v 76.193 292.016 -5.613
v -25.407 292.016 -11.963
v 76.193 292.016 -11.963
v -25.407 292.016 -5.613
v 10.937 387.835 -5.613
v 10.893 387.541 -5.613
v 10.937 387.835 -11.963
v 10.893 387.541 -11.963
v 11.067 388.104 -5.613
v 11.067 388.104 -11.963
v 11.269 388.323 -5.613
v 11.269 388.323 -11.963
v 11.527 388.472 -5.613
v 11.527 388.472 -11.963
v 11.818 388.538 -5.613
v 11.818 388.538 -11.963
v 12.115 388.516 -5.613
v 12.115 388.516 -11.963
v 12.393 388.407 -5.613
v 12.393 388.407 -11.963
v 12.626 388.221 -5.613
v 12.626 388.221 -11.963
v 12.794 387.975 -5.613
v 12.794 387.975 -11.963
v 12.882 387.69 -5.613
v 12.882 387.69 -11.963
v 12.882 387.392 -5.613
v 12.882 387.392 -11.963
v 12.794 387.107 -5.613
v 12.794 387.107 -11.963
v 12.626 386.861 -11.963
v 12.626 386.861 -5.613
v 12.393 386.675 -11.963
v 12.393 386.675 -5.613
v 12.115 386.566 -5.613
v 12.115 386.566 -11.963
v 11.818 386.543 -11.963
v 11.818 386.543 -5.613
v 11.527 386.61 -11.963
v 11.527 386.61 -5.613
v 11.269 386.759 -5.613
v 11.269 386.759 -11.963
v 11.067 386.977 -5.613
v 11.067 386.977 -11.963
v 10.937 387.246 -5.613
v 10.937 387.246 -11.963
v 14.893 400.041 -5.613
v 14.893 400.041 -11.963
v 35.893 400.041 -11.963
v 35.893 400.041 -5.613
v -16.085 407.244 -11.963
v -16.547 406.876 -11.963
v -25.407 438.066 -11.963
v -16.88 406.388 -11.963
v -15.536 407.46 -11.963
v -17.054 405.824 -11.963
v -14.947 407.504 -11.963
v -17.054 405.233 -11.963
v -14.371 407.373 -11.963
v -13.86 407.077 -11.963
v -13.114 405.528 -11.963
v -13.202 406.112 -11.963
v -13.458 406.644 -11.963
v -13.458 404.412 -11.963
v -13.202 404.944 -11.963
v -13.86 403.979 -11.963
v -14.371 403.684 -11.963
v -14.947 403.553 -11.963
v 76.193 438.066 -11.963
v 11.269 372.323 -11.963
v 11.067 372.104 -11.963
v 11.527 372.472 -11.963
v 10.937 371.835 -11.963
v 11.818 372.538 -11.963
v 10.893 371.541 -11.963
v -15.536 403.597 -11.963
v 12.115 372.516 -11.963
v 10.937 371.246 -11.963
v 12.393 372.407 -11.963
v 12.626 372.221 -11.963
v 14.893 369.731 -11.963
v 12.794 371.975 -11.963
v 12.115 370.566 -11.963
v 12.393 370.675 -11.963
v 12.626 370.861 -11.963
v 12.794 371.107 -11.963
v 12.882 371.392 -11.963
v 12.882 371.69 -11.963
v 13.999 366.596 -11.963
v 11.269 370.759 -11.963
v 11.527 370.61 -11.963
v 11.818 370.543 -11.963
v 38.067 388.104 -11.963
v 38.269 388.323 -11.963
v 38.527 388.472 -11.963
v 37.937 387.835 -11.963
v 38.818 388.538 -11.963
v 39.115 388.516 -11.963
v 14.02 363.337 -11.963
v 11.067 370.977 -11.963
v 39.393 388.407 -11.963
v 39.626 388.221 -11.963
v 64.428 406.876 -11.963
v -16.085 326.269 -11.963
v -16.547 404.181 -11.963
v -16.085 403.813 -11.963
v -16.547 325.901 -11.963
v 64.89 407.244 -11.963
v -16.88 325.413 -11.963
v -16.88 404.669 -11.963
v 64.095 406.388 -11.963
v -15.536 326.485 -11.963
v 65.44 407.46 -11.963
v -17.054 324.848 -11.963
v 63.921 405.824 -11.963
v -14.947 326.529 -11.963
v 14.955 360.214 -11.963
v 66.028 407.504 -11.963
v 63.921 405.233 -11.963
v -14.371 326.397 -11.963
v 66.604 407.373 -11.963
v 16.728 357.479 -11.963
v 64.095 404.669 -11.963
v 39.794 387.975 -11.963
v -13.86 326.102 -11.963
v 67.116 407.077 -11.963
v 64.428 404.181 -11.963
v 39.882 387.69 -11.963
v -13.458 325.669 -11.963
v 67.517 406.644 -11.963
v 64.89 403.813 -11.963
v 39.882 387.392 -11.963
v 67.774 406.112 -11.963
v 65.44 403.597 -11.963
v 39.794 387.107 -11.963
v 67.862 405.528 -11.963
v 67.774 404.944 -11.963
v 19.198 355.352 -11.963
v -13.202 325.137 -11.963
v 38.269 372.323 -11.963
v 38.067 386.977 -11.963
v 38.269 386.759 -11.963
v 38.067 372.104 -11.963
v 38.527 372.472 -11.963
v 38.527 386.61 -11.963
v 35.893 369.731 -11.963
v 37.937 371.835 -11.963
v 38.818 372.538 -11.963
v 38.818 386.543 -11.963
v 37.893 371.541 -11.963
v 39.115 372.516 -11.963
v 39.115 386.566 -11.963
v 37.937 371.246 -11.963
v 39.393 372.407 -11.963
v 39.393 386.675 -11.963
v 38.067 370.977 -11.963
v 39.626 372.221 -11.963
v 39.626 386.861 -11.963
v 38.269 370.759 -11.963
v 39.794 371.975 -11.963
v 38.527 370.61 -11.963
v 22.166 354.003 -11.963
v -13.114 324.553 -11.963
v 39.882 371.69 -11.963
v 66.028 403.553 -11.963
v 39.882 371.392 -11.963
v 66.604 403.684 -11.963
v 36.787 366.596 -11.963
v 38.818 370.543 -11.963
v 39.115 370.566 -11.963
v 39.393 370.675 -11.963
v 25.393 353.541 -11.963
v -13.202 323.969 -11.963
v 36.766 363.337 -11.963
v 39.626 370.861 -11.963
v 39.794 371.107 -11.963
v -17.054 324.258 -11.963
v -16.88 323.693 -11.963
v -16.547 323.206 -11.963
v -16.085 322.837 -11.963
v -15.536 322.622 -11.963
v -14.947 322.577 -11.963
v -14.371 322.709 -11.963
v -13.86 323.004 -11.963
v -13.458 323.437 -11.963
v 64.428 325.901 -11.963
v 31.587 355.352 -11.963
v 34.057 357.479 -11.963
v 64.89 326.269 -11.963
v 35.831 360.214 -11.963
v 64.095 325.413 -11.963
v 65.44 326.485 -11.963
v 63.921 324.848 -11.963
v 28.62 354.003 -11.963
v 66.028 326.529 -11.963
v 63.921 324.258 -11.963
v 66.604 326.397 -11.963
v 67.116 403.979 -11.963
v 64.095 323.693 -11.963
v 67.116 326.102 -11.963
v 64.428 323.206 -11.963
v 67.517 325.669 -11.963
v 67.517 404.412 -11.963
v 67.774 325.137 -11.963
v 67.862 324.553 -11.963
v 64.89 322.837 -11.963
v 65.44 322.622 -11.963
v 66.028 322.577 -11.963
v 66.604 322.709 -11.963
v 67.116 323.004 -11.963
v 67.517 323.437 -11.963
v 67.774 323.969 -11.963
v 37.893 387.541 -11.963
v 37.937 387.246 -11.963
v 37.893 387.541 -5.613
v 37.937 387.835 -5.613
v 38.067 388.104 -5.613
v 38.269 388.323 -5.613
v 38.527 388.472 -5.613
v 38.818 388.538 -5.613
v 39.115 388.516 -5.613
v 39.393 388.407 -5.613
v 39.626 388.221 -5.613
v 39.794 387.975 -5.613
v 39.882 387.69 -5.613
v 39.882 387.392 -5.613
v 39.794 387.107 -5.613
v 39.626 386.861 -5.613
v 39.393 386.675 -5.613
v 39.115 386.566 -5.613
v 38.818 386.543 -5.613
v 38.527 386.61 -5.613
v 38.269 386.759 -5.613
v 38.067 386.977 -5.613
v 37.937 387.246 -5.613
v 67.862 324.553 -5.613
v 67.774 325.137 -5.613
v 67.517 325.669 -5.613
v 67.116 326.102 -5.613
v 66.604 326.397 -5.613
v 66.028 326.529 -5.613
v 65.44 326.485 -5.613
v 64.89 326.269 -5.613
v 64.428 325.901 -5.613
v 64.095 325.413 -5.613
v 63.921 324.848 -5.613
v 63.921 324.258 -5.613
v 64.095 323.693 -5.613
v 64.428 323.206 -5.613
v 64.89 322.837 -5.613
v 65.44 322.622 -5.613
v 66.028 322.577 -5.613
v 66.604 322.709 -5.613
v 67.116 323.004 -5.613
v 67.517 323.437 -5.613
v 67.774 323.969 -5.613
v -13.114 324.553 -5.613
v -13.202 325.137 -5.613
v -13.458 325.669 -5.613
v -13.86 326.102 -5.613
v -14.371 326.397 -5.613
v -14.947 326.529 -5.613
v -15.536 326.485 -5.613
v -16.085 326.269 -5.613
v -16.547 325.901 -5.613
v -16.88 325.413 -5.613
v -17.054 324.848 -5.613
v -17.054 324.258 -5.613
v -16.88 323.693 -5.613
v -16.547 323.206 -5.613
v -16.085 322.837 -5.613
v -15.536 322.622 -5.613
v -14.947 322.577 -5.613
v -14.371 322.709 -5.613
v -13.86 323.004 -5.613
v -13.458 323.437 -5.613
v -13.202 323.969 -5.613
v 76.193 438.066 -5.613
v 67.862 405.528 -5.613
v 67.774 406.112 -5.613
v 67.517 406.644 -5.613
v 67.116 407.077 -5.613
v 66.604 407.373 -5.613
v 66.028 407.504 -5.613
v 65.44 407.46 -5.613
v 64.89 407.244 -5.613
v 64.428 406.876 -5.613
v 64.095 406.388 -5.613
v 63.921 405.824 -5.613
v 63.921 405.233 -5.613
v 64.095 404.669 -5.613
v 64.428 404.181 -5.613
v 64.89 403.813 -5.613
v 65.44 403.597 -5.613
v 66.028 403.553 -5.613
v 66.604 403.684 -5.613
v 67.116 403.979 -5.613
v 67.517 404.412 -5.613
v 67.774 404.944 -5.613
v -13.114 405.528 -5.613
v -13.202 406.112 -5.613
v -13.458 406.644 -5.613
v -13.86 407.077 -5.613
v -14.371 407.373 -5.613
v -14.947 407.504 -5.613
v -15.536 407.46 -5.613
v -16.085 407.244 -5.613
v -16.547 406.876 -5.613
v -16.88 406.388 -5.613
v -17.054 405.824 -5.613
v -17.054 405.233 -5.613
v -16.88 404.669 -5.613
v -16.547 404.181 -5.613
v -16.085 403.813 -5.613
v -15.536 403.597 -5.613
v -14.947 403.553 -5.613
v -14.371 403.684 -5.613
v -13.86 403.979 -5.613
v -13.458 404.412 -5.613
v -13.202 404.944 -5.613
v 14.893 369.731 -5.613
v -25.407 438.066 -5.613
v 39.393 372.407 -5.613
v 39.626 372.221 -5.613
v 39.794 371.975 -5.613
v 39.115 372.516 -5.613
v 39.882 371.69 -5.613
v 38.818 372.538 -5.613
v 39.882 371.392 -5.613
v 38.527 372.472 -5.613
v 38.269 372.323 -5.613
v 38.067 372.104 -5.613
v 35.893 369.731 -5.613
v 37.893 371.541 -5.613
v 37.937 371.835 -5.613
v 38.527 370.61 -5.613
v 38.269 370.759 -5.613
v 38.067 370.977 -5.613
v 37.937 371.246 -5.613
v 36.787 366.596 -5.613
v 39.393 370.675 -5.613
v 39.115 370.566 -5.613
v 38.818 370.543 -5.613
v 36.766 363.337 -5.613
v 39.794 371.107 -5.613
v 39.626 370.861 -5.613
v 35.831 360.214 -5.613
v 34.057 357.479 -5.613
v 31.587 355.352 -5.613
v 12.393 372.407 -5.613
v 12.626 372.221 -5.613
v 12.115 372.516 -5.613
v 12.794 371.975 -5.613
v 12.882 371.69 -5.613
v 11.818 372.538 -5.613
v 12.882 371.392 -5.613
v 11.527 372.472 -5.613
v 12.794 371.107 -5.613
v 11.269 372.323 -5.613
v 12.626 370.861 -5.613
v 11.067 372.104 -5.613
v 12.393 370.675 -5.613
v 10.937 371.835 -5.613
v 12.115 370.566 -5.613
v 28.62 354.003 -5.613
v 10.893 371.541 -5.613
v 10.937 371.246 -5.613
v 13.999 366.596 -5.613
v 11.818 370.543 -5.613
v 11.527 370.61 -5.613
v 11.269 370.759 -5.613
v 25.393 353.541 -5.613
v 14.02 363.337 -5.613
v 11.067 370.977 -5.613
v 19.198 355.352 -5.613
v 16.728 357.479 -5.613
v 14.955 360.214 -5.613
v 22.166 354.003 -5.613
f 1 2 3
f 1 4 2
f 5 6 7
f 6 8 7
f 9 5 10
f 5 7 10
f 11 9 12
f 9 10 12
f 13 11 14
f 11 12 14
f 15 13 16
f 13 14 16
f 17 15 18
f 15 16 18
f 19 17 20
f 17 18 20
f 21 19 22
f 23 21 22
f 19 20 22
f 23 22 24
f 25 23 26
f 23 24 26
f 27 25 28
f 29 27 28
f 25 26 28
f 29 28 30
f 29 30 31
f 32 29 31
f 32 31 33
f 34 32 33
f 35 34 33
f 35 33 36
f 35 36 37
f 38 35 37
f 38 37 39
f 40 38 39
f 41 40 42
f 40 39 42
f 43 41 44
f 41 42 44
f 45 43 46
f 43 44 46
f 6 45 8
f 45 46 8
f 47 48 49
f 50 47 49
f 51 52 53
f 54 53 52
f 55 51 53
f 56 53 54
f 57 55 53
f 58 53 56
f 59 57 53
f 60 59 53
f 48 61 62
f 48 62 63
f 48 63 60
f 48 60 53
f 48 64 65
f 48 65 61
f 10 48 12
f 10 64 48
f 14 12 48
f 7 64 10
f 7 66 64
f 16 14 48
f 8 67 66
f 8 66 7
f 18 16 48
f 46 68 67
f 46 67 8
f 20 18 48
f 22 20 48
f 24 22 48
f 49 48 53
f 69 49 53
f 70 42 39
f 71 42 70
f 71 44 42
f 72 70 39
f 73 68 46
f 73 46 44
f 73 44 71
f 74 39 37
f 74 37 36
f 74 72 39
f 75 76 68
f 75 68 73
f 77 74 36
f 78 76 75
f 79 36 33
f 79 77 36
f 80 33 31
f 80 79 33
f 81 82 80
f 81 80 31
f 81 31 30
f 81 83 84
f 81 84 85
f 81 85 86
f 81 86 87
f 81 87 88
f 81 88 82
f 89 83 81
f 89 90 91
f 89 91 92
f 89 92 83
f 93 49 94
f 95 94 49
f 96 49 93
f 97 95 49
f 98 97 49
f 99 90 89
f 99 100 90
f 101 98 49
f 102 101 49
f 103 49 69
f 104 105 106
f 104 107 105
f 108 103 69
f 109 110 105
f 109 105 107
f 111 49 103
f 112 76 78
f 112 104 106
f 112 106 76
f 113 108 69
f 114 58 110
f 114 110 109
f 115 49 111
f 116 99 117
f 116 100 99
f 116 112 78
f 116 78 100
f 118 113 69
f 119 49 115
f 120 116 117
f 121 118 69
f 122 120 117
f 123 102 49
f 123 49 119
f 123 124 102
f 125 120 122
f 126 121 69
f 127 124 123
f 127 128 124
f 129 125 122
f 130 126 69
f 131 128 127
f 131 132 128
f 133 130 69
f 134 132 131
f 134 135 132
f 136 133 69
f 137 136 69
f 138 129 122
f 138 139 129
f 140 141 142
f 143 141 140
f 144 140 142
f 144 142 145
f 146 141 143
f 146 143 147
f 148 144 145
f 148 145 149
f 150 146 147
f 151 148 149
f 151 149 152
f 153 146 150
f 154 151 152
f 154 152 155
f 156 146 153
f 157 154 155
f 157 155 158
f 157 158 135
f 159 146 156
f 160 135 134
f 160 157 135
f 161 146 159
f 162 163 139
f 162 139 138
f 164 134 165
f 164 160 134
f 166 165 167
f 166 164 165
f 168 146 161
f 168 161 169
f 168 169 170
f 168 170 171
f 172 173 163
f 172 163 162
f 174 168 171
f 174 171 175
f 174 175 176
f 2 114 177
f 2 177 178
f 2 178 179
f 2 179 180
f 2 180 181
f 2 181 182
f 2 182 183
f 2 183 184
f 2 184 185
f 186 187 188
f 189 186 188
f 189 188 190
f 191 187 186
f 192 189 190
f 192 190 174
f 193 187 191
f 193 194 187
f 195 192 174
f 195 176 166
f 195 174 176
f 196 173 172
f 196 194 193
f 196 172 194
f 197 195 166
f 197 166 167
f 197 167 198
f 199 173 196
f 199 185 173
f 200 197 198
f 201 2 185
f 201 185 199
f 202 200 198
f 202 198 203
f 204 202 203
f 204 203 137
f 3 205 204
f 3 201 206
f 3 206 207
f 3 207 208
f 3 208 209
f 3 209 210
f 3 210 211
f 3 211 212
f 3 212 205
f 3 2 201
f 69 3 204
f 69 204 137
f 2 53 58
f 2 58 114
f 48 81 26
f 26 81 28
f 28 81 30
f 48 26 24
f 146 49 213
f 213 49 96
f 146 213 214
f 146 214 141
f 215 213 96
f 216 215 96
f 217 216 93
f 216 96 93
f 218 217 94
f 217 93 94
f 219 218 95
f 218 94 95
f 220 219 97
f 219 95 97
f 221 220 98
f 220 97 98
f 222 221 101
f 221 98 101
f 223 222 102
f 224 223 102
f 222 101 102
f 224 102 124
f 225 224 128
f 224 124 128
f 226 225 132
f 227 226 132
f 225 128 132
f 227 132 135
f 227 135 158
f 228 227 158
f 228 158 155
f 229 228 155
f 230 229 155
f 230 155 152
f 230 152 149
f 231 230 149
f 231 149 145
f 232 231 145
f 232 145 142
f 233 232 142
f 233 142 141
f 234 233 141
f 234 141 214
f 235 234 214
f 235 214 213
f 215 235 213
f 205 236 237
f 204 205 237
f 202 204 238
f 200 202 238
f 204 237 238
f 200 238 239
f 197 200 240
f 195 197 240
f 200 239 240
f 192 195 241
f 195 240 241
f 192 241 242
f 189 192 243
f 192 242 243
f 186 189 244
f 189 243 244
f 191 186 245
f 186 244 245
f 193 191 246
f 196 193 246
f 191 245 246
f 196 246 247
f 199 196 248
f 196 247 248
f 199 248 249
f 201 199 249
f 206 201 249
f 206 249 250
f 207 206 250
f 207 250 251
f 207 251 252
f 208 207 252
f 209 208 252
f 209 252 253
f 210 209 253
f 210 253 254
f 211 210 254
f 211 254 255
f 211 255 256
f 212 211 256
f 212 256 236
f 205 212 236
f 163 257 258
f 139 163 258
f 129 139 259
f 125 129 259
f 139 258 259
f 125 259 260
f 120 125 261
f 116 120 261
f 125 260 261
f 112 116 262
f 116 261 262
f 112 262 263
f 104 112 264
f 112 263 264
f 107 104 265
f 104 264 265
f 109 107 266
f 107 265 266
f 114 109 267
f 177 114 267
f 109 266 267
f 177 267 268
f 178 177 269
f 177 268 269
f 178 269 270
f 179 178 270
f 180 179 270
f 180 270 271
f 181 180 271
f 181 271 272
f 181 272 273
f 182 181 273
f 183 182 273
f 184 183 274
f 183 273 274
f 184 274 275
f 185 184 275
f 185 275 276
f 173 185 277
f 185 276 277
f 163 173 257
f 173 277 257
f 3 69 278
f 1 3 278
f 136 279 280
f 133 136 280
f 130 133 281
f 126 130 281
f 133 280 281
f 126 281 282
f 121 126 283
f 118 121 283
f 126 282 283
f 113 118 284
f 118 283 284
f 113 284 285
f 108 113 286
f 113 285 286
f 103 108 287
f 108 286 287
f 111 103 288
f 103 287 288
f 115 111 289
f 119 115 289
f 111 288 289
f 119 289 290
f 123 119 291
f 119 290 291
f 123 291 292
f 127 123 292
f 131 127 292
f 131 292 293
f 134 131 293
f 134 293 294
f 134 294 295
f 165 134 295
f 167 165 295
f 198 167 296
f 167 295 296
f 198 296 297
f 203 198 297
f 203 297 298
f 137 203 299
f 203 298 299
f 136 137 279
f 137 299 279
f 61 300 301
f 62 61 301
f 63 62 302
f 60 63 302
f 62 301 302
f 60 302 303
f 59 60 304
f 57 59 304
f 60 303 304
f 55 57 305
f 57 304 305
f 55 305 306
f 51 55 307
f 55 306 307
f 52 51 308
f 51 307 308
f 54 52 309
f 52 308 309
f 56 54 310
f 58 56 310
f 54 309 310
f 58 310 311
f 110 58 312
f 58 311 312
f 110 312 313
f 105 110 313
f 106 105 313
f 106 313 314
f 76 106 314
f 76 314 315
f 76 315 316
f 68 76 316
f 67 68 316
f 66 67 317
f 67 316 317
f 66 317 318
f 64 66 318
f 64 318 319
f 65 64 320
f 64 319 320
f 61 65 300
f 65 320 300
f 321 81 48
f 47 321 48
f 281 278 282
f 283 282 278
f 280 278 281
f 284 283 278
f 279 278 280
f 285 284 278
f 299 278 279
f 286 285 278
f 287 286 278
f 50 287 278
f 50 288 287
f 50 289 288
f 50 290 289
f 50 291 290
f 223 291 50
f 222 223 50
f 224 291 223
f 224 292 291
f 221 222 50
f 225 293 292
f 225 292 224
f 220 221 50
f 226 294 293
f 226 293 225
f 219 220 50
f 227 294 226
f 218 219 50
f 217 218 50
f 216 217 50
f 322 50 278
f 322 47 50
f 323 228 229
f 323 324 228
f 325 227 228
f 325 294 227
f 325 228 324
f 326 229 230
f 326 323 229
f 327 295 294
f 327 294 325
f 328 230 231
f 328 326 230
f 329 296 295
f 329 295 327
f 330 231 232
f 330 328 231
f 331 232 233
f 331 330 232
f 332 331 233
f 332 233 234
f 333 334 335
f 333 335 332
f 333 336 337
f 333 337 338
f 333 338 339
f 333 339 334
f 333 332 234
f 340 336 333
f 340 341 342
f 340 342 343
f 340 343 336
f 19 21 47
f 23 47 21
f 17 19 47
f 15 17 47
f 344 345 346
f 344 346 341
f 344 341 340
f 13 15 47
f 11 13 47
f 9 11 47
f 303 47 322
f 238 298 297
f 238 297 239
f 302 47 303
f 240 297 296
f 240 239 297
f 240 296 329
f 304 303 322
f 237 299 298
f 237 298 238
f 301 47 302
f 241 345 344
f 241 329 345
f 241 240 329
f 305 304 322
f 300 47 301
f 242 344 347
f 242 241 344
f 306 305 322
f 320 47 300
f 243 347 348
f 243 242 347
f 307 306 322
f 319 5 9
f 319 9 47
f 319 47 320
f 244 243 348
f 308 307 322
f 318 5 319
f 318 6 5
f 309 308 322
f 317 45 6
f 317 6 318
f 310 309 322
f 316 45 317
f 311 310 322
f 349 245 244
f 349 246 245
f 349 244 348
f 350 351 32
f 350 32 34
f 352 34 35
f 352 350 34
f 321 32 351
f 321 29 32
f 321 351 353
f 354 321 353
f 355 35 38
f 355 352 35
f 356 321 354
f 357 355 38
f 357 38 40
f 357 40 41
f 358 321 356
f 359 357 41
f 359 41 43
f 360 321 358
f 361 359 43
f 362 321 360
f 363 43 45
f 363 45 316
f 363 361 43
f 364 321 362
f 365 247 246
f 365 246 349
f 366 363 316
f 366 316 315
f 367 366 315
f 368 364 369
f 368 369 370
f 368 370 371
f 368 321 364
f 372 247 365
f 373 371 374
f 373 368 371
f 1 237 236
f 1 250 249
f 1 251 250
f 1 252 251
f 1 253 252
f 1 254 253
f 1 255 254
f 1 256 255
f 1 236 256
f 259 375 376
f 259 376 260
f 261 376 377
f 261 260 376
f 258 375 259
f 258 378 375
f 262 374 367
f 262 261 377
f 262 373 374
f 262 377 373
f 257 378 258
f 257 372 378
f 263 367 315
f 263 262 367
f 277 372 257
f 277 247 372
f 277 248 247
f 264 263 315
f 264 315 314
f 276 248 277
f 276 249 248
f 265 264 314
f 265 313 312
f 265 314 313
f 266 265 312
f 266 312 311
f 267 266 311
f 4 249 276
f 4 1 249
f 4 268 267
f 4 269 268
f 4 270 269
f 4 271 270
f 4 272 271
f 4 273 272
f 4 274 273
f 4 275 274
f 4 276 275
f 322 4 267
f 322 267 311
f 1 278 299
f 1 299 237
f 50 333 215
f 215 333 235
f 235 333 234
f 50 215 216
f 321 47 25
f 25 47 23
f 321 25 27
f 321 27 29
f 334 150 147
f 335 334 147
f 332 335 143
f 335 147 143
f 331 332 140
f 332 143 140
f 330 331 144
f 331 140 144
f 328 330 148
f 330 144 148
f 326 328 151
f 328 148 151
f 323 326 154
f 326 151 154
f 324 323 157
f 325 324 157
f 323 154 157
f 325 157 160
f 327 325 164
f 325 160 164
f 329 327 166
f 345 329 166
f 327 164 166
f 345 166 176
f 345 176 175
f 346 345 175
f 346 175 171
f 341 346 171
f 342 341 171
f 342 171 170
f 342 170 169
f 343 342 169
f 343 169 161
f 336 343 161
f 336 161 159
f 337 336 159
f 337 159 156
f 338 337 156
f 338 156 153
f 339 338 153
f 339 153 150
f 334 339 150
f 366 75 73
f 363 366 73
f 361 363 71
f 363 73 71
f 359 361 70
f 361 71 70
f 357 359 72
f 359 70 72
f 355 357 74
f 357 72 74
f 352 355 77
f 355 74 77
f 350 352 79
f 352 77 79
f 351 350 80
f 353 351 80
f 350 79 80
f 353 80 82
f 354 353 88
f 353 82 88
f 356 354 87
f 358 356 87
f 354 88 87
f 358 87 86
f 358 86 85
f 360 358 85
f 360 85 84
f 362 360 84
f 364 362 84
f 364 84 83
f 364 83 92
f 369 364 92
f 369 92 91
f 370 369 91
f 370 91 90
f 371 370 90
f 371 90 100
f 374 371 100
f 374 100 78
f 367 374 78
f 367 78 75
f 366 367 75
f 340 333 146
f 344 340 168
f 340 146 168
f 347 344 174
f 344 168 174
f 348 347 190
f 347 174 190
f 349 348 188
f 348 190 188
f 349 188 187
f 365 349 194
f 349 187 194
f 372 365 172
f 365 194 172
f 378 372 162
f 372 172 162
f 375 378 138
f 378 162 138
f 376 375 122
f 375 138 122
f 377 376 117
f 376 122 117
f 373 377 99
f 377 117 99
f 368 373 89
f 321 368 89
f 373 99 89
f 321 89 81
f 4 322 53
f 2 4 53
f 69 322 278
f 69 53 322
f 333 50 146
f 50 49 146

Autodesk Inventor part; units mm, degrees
ref_plane "YZ Plane" through (0, 0, 0) normal (1, 0, 0) x (0, 1, 0)
ref_plane "XZ Plane" through (0, 0, 0) normal (0, 1, 0) x (-1, 0, 0)
ref_plane "XY Plane" through (0, 0, 0) normal (0, 0, 1) x (1, 0, 0)
sketch "Sketch1" plane through (0, 0, 0) normal (0, 0, 1) x (1, 0, 0)
  line L0 (-25.4072, 25.3665) -> (76.1928, 25.3665)
  line L1 (76.1928, 25.3665) -> (76.1928, -76.2335)
  line L2 (76.1928, -76.2335) -> (-25.4072, -76.2335)
  line L3 (-25.4072, -76.2335) -> (-25.4072, 25.3665)
  point P0 (0, 0)
  dimension "d0" = 101.6
  dimension "d1" = 101.6
extrude "Extrusion1" add sketch "Sketch1" along normal blind 0.7366
sketch "Sketch2" plane through (0, 0, 0.7366) normal (0, 0, 1) x (1, 0, 0)
  line L0 (-25.4072, 25.3665) -> (76.1928, -76.2335)
  line L1 (76.1928, 25.3665) -> (-25.4072, -76.2335)
  circle A0 centre (25.3928, -25.4335) radius 27.432
  point P0 (0, 0)
  dimension "d4" = 54.864
extrude "Extrusion2" cut sketch "Sketch2" against normal blind 0.7366
sketch "Sketch3" plane through (0, 0, 0.7366) normal (0, 0, 1) x (1, 0, 0)
  line L0 (-25.4072, -76.2335) -> (-25.4072, 25.3665) projected
  line L1 (-25.4072, 25.3665) -> (-25.4072, -25.4335)
  line L2 (-25.4072, -25.4335) -> (-25.4072, 19.4102)
  line L3 (-25.4072, 25.3665) -> (76.1928, -76.2335)
  line L4 (76.1928, 25.3665) -> (-25.4072, -76.2335)
  circle A0 centre (-19.4509, 19.4102) radius 1.9812
  point P0 (0, 0)
  dimension "d7" = 44.8437
  dimension "d8" = 3.9624
extrude "Extrusion3" cut sketch "Sketch3" against normal blind 0.7366 contours A0 L3 | L3 A0
sketch "Sketch4" plane through (0, 0, 0.7366) normal (0, 0, 1) x (1, 0, 0)
  line L0 (-25.4072, -76.2335) -> (76.1928, 25.3665)
  line L1 (-25.4072, 25.3665) -> (76.1928, -76.2335)
  circle A0 centre (70.2365, 19.4102) radius 1.9819
  circle A1 centre (70.2365, -70.2772) radius 1.983
  circle A2 centre (-19.4509, -70.2772) radius 1.9812
  point P0 (0, 0)
extrude "Extrusion4" cut sketch "Sketch4" against normal blind 0.7366
sketch "Sketch5" plane through (0, 0, 0.7366) normal (0, 0, 1) x (1, 0, 0)
  circle A0 centre (25.3928, -25.4335) radius 27.432 projected
  circle A1 centre (25.3928, -25.4335) radius 29.972
  circle A2 centre (25.3928, -25.4335) radius 32.512
  point P0 (0, 0)
  dimension "d13" = 59.944
  dimension "d14" = 65.024
extrude "Extrusion5" add sketch "Sketch5" along normal blind 6.6548 contours A2
fillet "Fillet1" radius 3.175 4 edges at (-25.4072, 25.3665, 0.3683) (76.1928, 25.3665, 0.3683) (76.1928, -76.2335, 0.3683) (-25.4072, -76.2335, 0.3683)
sketch "Sketch6" plane through (25.3928, -25.4335, 0.7366) normal (0, 0, 1) x (1, 0, 0)
  circle A0 centre (0, 0) radius 29.972 projected
  circle A1 centre (0, 0) radius 27.432 projected
  point P0 (-25.3928, 25.4335)
extrude "Extrusion6" add sketch "Sketch6" along normal blind 9.1948
sketch "Sketch7" plane through (25.3928, -25.4335, 7.3914) normal (0, 0, 1) x (1, 0, 0)
  circle A0 centre (0, 0) radius 29.972 projected
  circle A1 centre (0, 0) radius 32.512 projected
  point P0 (-25.3928, 25.4335)
extrude "Extrusion7" cut sketch "Sketch7" against normal blind 6.6548
sketch "Sketch8" plane through (25.3928, -25.4335, 9.9314) normal (0, 0, 1) x (1, 0, 0)
  circle A0 centre (0, 0) radius 27.432 projected
  circle A1 centre (0, 0) radius 29.972 projected
  point P0 (-25.3928, 25.4335)
extrude "Extrusion8" cut sketch "Sketch8" against normal blind 2.54
sketch "Sketch9" plane through (0, 0, 0.7366) normal (0, 0, 1) x (1, 0, 0)
  circle A0 centre (-19.4509, 19.4102) radius 1.9812 projected
  circle A1 centre (70.2365, -70.2772) radius 1.983 projected
  circle A2 centre (-19.4509, -70.2772) radius 1.9812 projected
  circle A3 centre (70.2365, 19.4102) radius 1.9819 projected
  point P0 (0, 0)
extrude "Extrusion9" add sketch "Sketch9" against normal blind 0.7366
sketch "Sketch10" plane through (0, 0, 0.7366) normal (0, 0, 1) x (1, 0, 0)
  line L0 (-25.4072, 25.3665) -> (76.1928, 25.3665)
  line L1 (76.1928, 25.3665) -> (76.1928, -76.2335)
  line L2 (76.1928, -76.2335) -> (-25.4072, -76.2335)
  line L3 (-25.4072, -76.2335) -> (-25.4072, 25.3665)
  line L4 (-25.4072, 25.3665) -> (76.1928, -76.2335)
  line L5 (-25.4072, -76.2335) -> (76.1928, 25.3665)
  line L6 (-25.4072, 25.3665) -> (-25.4072, -25.4335)
  line L7 (-25.4072, -25.4335) -> (-25.4072, 15.0541)
  circle A0 centre (-15.0948, 15.0541) radius 1.9812
  circle A1 centre (65.8804, 15.0541) radius 1.9818
  circle A2 centre (65.8804, -65.9211) radius 1.9832
  circle A3 centre (-15.0948, -65.9211) radius 1.9812
  point P0 (0, 0)
  dimension "d26" = 40.4876
  dimension "d27" = 3.9624
extrude "Extrusion10" cut sketch "Sketch10" against normal blind 0.7366 contours A0 L4 | L4 A0 | A1 L5 | L5 A1 | A2 L4 | L4 A2 | A3 L5 | L5 A3
sketch "Sketch11" plane through (0, 0, 0.7366) normal (0, 0, 1) x (1, 0, 0)
  circle A0 centre (-15.0948, 15.0541) radius 1.9812 projected
  circle A1 centre (-15.0948, -65.9211) radius 1.9812 projected
  circle A2 centre (65.8804, 15.0541) radius 1.9818 projected
  circle A3 centre (65.8804, -65.9211) radius 1.9832 projected
  line L0 (-25.4072, 25.3665) -> (76.1928, 25.3665)
  line L1 (76.1928, 25.3665) -> (76.1928, -76.2335)
  line L2 (76.1928, -76.2335) -> (-25.4072, -76.2335)
  line L3 (-25.4072, -76.2335) -> (-25.4072, 25.3665)
  point P0 (0, 0)
extrude "Extrusion11" add sketch "Sketch11" along normal blind 12.7
sketch "Sketch12" plane through (0, 0, 13.4366) normal (0, 0, 1) x (1, 0, 0)
  circle A0 centre (65.8804, -65.9211) radius 1.9832 projected
  circle A1 centre (65.8804, 15.0541) radius 1.9818 projected
  circle A2 centre (-15.0948, 15.0541) radius 1.9812 projected
  circle A3 centre (-15.0948, -65.9211) radius 1.9812 projected
  line L0 (76.1928, 25.3665) -> (76.1928, -76.2335) projected
  line L1 (-25.4072, 25.3665) -> (76.1928, 25.3665) projected
  line L2 (-25.4072, -76.2335) -> (-25.4072, 25.3665) projected
  line L3 (76.1928, -76.2335) -> (-25.4072, -76.2335) projected
  point P0 (0, 0)
extrude "Extrusion12" add sketch "Sketch12" against normal blind 19.05
sketch "Sketch13" plane through (0, 0, 13.4366) normal (0, 0, 1) x (1, 0, 0)
  circle A0 centre (65.8804, -65.9211) radius 1.9832 projected
  circle A1 centre (65.8804, 15.0541) radius 1.9818 projected
  circle A2 centre (-15.0948, 15.0541) radius 1.9812 projected
  circle A3 centre (-15.0948, -65.9211) radius 1.9812 projected
  line L0 (76.1928, 25.3665) -> (76.1928, -76.2335) projected
  line L1 (-25.4072, 25.3665) -> (76.1928, 25.3665) projected
  line L2 (-25.4072, -76.2335) -> (-25.4072, 25.3665) projected
  line L3 (76.1928, -76.2335) -> (-25.4072, -76.2335) projected
  point P0 (0, 0)
extrude "Extrusion13" cut sketch "Sketch13" against normal blind 12.7
sketch "Sketch14" plane through (-25.4072, 25.3665, -5.6134) normal (0, 1, 0) x (1, 0, 0)
  line L0 (0, -6.35) -> (101.6, -6.35) projected
  line L1 (101.6, -6.35) -> (101.6, 0) projected
  line L2 (101.6, 0) -> (0, 0) projected
  line L3 (0, 0) -> (0, -6.35) projected
  point P0 (25.4072, -5.6134)
sketch "Sketch15" plane through (-25.4072, -76.2335, -5.6134) normal (-1, 0, 0) x (0, 0, 1)
  line L0 (6.35, 0) -> (6.35, 101.6) projected
  line L1 (0, 101.6) -> (6.35, 101.6) projected
  line L2 (0, 101.6) -> (0, 0) projected
  line L3 (6.35, 0) -> (0, 0) projected
  point P0 (5.6134, 76.2335)
sketch "Sketch16" plane through (-25.4072, -76.2335, -5.6134) normal (0, -1, 0) x (1, 0, 0)
  line L0 (101.6, 6.35) -> (0, 6.35) projected
  line L1 (0, 6.35) -> (0, 0) projected
  line L2 (0, 0) -> (101.6, 0) projected
  line L3 (101.6, 6.35) -> (101.6, 0) projected
  point P0 (25.4072, 5.6134)
sketch "Sketch17" plane through (76.1928, -76.2335, -5.6134) normal (1, 0, 0) x (0, 0, -1)
  line L0 (-6.35, 101.6) -> (-6.35, 0) projected
  line L1 (-6.35, 0) -> (0, 0) projected
  line L2 (0, 0) -> (0, 101.6) projected
  line L3 (-6.35, 101.6) -> (0, 101.6) projected
  point P0 (-5.6134, 76.2335)
extrude "Extrusion14" add sketch "Sketch14" along normal blind 53.975
extrude "Extrusion15" add sketch "Sketch17" along normal blind 47.625
extrude "Extrusion16" add sketch "Sketch16" along normal blind 47.625
extrude "Extrusion17" add sketch "Sketch15" along normal blind 53.975
sketch "Sketch18" plane through (-25.4072, 25.3665, 0.7366) normal (0, 1, 0) x (1, 0, 0)
  line L0 (-53.975, 6.35) -> (-53.975, 0) projected
  line L1 (0, 0) -> (-53.975, 0) projected
  line L2 (0, 6.35) -> (0, 0) projected
  line L3 (0, 6.35) -> (-53.975, 6.35) projected
  point P0 (25.4072, 0.7366)
extrude "Extrusion18" add sketch "Sketch18" along normal blind 53.975
sketch "Sketch19" plane through (76.1928, 25.3665, 0.7366) normal (0, 1, 0) x (1, 0, 0)
  line L0 (47.625, 0) -> (47.625, 6.35) projected
  line L1 (0, 6.35) -> (47.625, 6.35) projected
  line L2 (0, 0) -> (0, 6.35) projected
  line L3 (0, 0) -> (47.625, 0) projected
  point P0 (-76.1928, 0.7366)
extrude "Extrusion19" add sketch "Sketch19" along normal blind 53.975
sketch "Sketch20" plane through (-25.4072, -123.8585, -5.6134) normal (-1, 0, 0) x (0, 0, 1)
  line L0 (6.35, 47.625) -> (0, 47.625) projected
  line L1 (0, 47.625) -> (0, 0) projected
  line L2 (0, 0) -> (6.35, 0) projected
  line L3 (6.35, 0) -> (6.35, 47.625) projected
  point P0 (5.6134, 123.8585)
extrude "Extrusion20" add sketch "Sketch20" along normal blind 53.975
sketch "Sketch21" plane through (123.8178, -76.2335, -5.6134) normal (0, -1, 0) x (1, 0, 0)
  line L0 (-47.625, 6.35) -> (-47.625, 0) projected
  line L1 (-47.625, 0) -> (0, 0) projected
  line L2 (0, 0) -> (0, 6.35) projected
  line L3 (0, 6.35) -> (-47.625, 6.35) projected
  point P0 (-123.8178, 5.6134)
extrude "Extrusion21" add sketch "Sketch21" along normal blind 47.625
sketch "Sketch22" plane through (-25.4072, 79.3415, -5.6134) normal (0, 1, 0) x (1, 0, 0)
  line L0 (149.225, -6.35) -> (-53.975, -6.35) projected
  line L1 (149.225, 0) -> (149.225, -6.35) projected
  line L2 (-53.975, 0) -> (149.225, 0) projected
  line L3 (-53.975, -6.35) -> (-53.975, 0) projected
  point P0 (25.4072, -5.6134)
extrude "Extrusion22" cut sketch "Sketch22" against normal blind 53.975
sketch "Sketch23" plane through (-79.3822, -76.2335, -5.6134) normal (-1, 0, 0) x (0, 0, 1)
  line L0 (6.35, 101.6) -> (0, 101.6) projected
  line L1 (0, -47.625) -> (0, 101.6) projected
  line L2 (6.35, -47.625) -> (0, -47.625) projected
  line L3 (6.35, 101.6) -> (6.35, -47.625) projected
  point P0 (5.6134, 76.2335)
extrude "Extrusion23" cut sketch "Sketch23" against normal blind 53.975
sketch "Sketch24" plane through (-25.4072, -123.8585, -5.6134) normal (0, -1, 0) x (1, 0, 0)
  line L0 (0, 6.35) -> (0, 0) projected
  line L1 (149.225, 0) -> (0, 0) projected
  line L2 (149.225, 6.35) -> (149.225, 0) projected
  line L3 (0, 6.35) -> (149.225, 6.35) projected
  point P0 (25.4072, 5.6134)
extrude "Extrusion24" cut sketch "Sketch24" against normal blind 47.625
sketch "Sketch25" plane through (123.8178, -76.2335, -5.6134) normal (1, 0, 0) x (0, 0, -1)
  line L0 (-6.35, 0) -> (0, 0) projected
  line L1 (0, 101.6) -> (0, 0) projected
  line L2 (0, 101.6) -> (-6.35, 101.6) projected
  line L3 (-6.35, 0) -> (-6.35, 101.6) projected
  point P0 (-5.6134, 76.2335)
extrude "Extrusion25" cut sketch "Sketch25" against normal blind 47.625
sketch "Sketch26" plane through (-25.4072, 25.3665, -5.6134) normal (0, 1, 0) x (1, 0, 0)
  line L0 (101.6, -6.35) -> (101.6, 0) projected
  line L1 (0, 0) -> (101.6, 0) projected
  line L2 (0, 0) -> (0, -6.35) projected
  line L3 (101.6, -6.35) -> (0, -6.35) projected
  point P0 (25.4072, -5.6134)
extrude "Extrusion26" add sketch "Sketch26" along normal blind 53.975
sketch "Sketch27" plane through (-25.4072, -76.2335, -5.6134) normal (-1, 0, 0) x (0, 0, 1)
  line L0 (0, 0) -> (6.35, 0) projected
  line L1 (6.35, 0) -> (6.35, 155.575) projected
  line L2 (6.35, 155.575) -> (0, 155.575) projected
  line L3 (0, 0) -> (0, 155.575) projected
  point P0 (5.6134, 76.2335)
extrude "Extrusion27" add sketch "Sketch27" along normal blind 53.975
sketch "Sketch28" plane through (-25.4072, -76.2335, -5.6134) normal (0, -1, 0) x (1, 0, 0)
  line L0 (101.6, 0) -> (101.6, 6.35) projected
  line L1 (101.6, 6.35) -> (-53.975, 6.35) projected
  line L2 (-53.975, 6.35) -> (-53.975, 0) projected
  line L3 (101.6, 0) -> (-53.975, 0) projected
  point P0 (25.4072, 5.6134)
extrude "Extrusion28" add sketch "Sketch28" along normal blind 22.225
sketch "Sketch29" plane through (-25.4072, 79.3415, -5.6134) normal (0, 1, 0) x (1, 0, 0)
  line L0 (101.6, -6.35) -> (-53.975, -6.35) projected
  line L1 (101.6, 0) -> (101.6, -6.35) projected
  line L2 (-53.975, 0) -> (101.6, 0) projected
  line L3 (-53.975, 0) -> (-53.975, -6.35) projected
  point P0 (25.4072, -5.6134)
extrude "Extrusion29" add sketch "Sketch29" along normal blind 158.6992
sketch "Sketch30" plane through (-25.4072, 238.0407, -5.6134) normal (0, 1, 0) x (1, 0, 0)
  line L0 (-53.975, -6.35) -> (-53.975, 0) projected
  line L1 (101.6, -6.35) -> (-53.975, -6.35) projected
  line L2 (101.6, 0) -> (101.6, -6.35) projected
  line L3 (-53.975, 0) -> (101.6, 0) projected
  point P0 (25.4072, -5.6134)
extrude "Extrusion30" add sketch "Sketch30" along normal blind 177.8
sketch "Sketch31" plane through (0, 0, 0.7366) normal (0, 0, 1) x (1, 0, 0)
  line L0 (76.1928, 415.8407) -> (76.1928, -98.4585) projected
  line L1 (76.1928, 415.8407) -> (-79.3822, 415.8407) projected
  line L2 (65.8804, 415.8407) -> (65.8804, 383.3033)
  line L3 (65.8804, 383.3033) -> (-17.076, 383.3033)
  line L4 (-17.076, 383.3033) -> (-13.1136, 383.3033)
  line L5 (-13.1136, 383.3033) -> (-15.0948, 383.3033)
  circle A0 centre (-15.0948, 383.3033) radius 1.9812
  circle A1 centre (65.8804, 383.3033) radius 1.9812
  line L6 (65.8804, 383.3033) -> (65.8804, 302.3281)
  circle A2 centre (65.8804, 302.3281) radius 1.9812
  line L7 (-15.0948, 383.3033) -> (-15.0948, 302.3281)
  circle A3 centre (-15.0948, 302.3281) radius 1.9812
  point P0 (0, 0)
  dimension "d70" = 32.5374
  dimension "d71" = 80.9752
extrude "Extrusion31" cut sketch "Sketch31" against normal blind 177.8
sketch "Sketch32" plane through (0, 0, -5.6134) normal (0, 0, -1) x (-1, 0, 0)
  circle A0 centre (15.0948, 383.3033) radius 1.9812 projected
  circle A1 centre (15.0948, 302.3281) radius 1.9812 projected
  circle A2 centre (-65.8804, 302.3281) radius 1.9812 projected
  circle A3 centre (-65.8804, 383.3033) radius 1.9812 projected
  circle A4 centre (15.0948, -65.9211) radius 1.9812 projected
  circle A5 centre (15.0948, 15.0541) radius 1.9812 projected
  circle A6 centre (-65.8804, 15.0541) radius 1.9818 projected
  circle A7 centre (-65.8804, -65.9211) radius 1.9832 projected
  line L0 (-76.1928, 415.8407) -> (-76.1928, -98.4585) projected
  line L1 (-76.1928, -98.4585) -> (79.3822, -98.4585) projected
  line L2 (79.3822, -98.4585) -> (79.3822, 415.8407) projected
  line L3 (79.3822, 415.8407) -> (-76.1928, 415.8407) projected
  point P0 (0, 0)
extrude "Extrusion32" add sketch "Sketch32" along normal blind 6.35
sketch "Sketch33" plane through (0, 0, 0.7366) normal (0, 0, 1) x (1, 0, 0)
  line L0 (76.1928, 415.8407) -> (76.1928, -98.4585) projected
  line L1 (76.1928, 158.6911) -> (76.1928, 107.8911)
  line L2 (76.1928, 107.8911) -> (25.3928, 107.8911)
  line L3 (25.3928, 107.8911) -> (25.3928, 209.4911)
  line L4 (25.3928, 209.4911) -> (76.1928, 209.4911)
  line L5 (76.1928, 209.4911) -> (76.1928, 107.8911)
  point P0 (0, 0)
  dimension "d76" = 50.8
  dimension "d77" = 50.8
  dimension "d78" = 101.6
extrude "Extrusion33" cut sketch "Sketch33" against normal blind 25.4
sketch "Sketch34" plane through (0, 0, 0.7366) normal (0, 0, 1) x (1, 0, 0)
  line L0 (25.3928, 107.8911) -> (25.3928, 209.4911) projected
  line L1 (76.1928, 107.8911) -> (76.1928, -98.4585) projected
  line L2 (25.3928, 158.6911) -> (-25.4072, 158.6911)
  circle A0 centre (-25.4072, 158.6911) radius 12.7
  point P0 (0, 0)
  dimension "d81" = 50.8
  dimension "d82" = 25.4
extrude "Extrusion34" cut sketch "Sketch34" against normal blind 25.4
fillet "Fillet2" radius 12.7 2 edges at (25.3928, 209.4911, -5.6134) (25.3928, 107.8911, -5.6134)
sketch "Sketch35" plane through (0, 0, 0.7366) normal (0, 0, 1) x (1, 0, 0)
  line L0 (-79.3822, 415.8407) -> (76.1928, 415.8407)
  line L1 (76.1928, 415.8407) -> (76.1928, 422.1907)
  line L2 (76.1928, 422.1907) -> (-79.3822, 422.1907)
  line L3 (-79.3822, 422.1907) -> (-79.3822, 415.8407)
  line L4 (-79.3822, -98.4585) -> (76.1928, -98.4585)
  line L5 (76.1928, -98.4585) -> (76.1928, -104.8085)
  line L6 (76.1928, -104.8085) -> (-79.3822, -104.8085)
  line L7 (-79.3822, -104.8085) -> (-79.3822, -98.4585)
  point P0 (0, 0)
  dimension "d86" = 6.35
  dimension "d87" = 6.35
extrude "Extrusion35" add sketch "Sketch35" against normal blind 6.35
sketch "Sketch36" plane through (-25.4072, 415.8407, -5.6134) normal (0, 1, 0) x (1, 0, 0)
  line L0 (-53.975, 0) -> (101.6, 0) projected
  line L1 (101.6, 6.35) -> (101.6, 0) projected
  line L2 (101.6, 6.35) -> (-53.975, 6.35) projected
  line L3 (-53.975, 0) -> (-53.975, 6.35) projected
  point P0 (25.4072, -5.6134)
extrude "Extrusion36" add sketch "Sketch36" along normal blind 6.35
sketch "Sketch37" plane through (-25.4072, -98.4585, -5.6134) normal (0, -1, 0) x (1, 0, 0)
  line L0 (101.6, 0) -> (-53.975, 0) projected
  line L1 (-53.975, -6.35) -> (-53.975, 0) projected
  line L2 (-53.975, -6.35) -> (101.6, -6.35) projected
  line L3 (101.6, 0) -> (101.6, -6.35) projected
  point P0 (25.4072, 5.6134)
extrude "Extrusion37" add sketch "Sketch37" along normal blind 6.35
sketch "Sketch38" plane through (0, 0, 0.7366) normal (0, 0, 1) x (1, 0, 0)
  line L0 (76.1928, 422.1907) -> (-79.3822, 422.1907) projected
  line L1 (76.1928, 107.8911) -> (76.1928, -104.8085) projected
  circle A0 centre (65.8804, 302.3281) radius 1.9812 projected
  circle A1 centre (-15.0948, 302.3281) radius 1.9812 projected
  line L2 (-15.0948, 422.1907) -> (-15.0948, 405.5283)
  line L3 (-15.0948, 405.5283) -> (65.8804, 405.5283)
  line L4 (65.8804, 302.3281) -> (65.8804, 324.5531)
  line L5 (-15.0948, 302.3281) -> (-15.0948, 324.5531)
  circle A2 centre (-15.0948, 324.5531) radius 1.9812
  circle A3 centre (-15.0948, 405.5283) radius 1.9812
  circle A4 centre (65.8804, 405.5283) radius 1.9812
  circle A5 centre (65.8804, 324.5531) radius 1.9812
  point P0 (0, 0)
  dimension "d94" = 16.6624
  dimension "d95" = 22.225
extrude "Extrusion38" cut sketch "Sketch38" against normal blind 12.7 contours A3 L3 L2 | L2 L3 A3 | A2 | A4 | A5
sketch "Sketch39" plane through (0, 0, 0.7366) normal (0, 0, 1) x (1, 0, 0)
  circle A0 centre (65.8804, 383.3033) radius 1.9812 projected
  circle A1 centre (65.8804, 302.3281) radius 1.9812 projected
  circle A2 centre (-15.0948, 302.3281) radius 1.9812 projected
  circle A3 centre (-15.0948, 383.3033) radius 1.9812 projected
  point P0 (0, 0)
extrude "Extrusion39" add sketch "Sketch39" against normal blind 12.7
sketch "Sketch40" plane through (0, 0, 0.7366) normal (0, 0, 1) x (1, 0, 0)
  circle A0 centre (-15.0948, 15.0541) radius 1.9812 projected
  circle A1 centre (-15.0948, -65.9211) radius 1.9812 projected
  line L0 (76.1928, 107.8911) -> (76.1928, -104.8085) projected
  line L1 (-15.0948, -65.9211) -> (-15.0948, -88.1461)
  line L2 (-15.0948, -88.1461) -> (65.8804, -88.1461)
  line L3 (-15.0948, 15.0541) -> (-15.0948, -7.1709)
  line L4 (-15.0948, -7.1709) -> (65.8804, -7.1709)
  circle A2 centre (-15.0948, -88.1461) radius 1.9812
  circle A3 centre (65.8804, -88.1461) radius 1.9818
  circle A4 centre (65.8804, -7.1709) radius 1.9818
  circle A5 centre (-15.0948, -7.1709) radius 1.9812
  point P0 (0, 0)
  dimension "d100" = 22.225
  dimension "d101" = 22.225
extrude "Extrusion40" cut sketch "Sketch40" against normal blind 12.7 contours A2 L2 L1 | L1 L2 A2 | A5 L4 L3 | L3 L4 A5 | A3 | A4
sketch "Sketch41" plane through (0, 0, 0.7366) normal (0, 0, 1) x (1, 0, 0)
  circle A0 centre (65.8804, -65.9211) radius 1.9832 projected
  circle A1 centre (65.8804, 15.0541) radius 1.9818 projected
  circle A2 centre (-15.0948, 15.0541) radius 1.9812 projected
  circle A3 centre (-15.0948, -65.9211) radius 1.9812 projected
  point P0 (0, 0)
extrude "Extrusion41" add sketch "Sketch41" against normal blind 12.7
sketch "Sketch42" plane through (0, 0, 0.7366) normal (0, 0, 1) x (1, 0, 0)
  circle A0 centre (65.8804, -7.1709) radius 1.9818 projected
  circle A1 centre (65.8804, -88.1461) radius 1.9818 projected
  circle A2 centre (-15.0948, -7.1709) radius 1.9812 projected
  circle A3 centre (-15.0948, -88.1461) radius 1.9812 projected
  circle A4 centre (-15.0948, 405.5283) radius 1.9812 projected
  circle A5 centre (-15.0948, 324.5531) radius 1.9812 projected
  circle A6 centre (65.8804, 405.5283) radius 1.9812 projected
  circle A7 centre (-25.4072, 158.6911) radius 12.7 projected
  line L0 (76.1928, 107.8911) -> (38.0928, 107.8911) projected
  arc A8 (25.3928, 120.5911) -> (38.0928, 107.8911) centre (38.0928, 120.5911) ccw projected
  line L1 (25.3928, 120.5911) -> (25.3928, 196.7911) projected
  arc A9 (38.0928, 209.4911) -> (25.3928, 196.7911) centre (38.0928, 196.7911) ccw projected
  line L2 (38.0928, 209.4911) -> (76.1928, 209.4911) projected
  line L3 (76.1928, 422.1907) -> (76.1928, 209.4911) projected
  line L4 (76.1928, 422.1907) -> (-79.3822, 422.1907) projected
  line L5 (-79.3822, 422.1907) -> (-79.3822, -104.8085) projected
  line L6 (-79.3822, -104.8085) -> (76.1928, -104.8085) projected
  line L7 (76.1928, 107.8911) -> (76.1928, -104.8085) projected
  line L8 (65.8804, 405.5283) -> (-15.0948, 405.5283)
  line L9 (-15.0948, 405.5283) -> (-15.0948, 324.5531)
  line L10 (25.3928, 365.0407) -> (25.3928, 415.8407)
  line L11 (25.3928, 415.8407) -> (-25.4072, 415.8407)
  line L12 (-25.4072, 415.8407) -> (76.1928, 415.8407)
  line L13 (76.1928, 415.8407) -> (76.1928, 314.2407)
  line L14 (76.1928, 314.2407) -> (-25.4072, 314.2407)
  line L15 (-25.4072, 314.2407) -> (-25.4072, 415.8407)
  point P0 (0, 0)
  dimension "d106" = 50.8
  dimension "d107" = 50.8
  dimension "d108" = 101.6
  dimension "d109" = 101.6
extrude "Extrusion42" cut sketch "Sketch42" against normal blind 25.4 contours L7 L6 L5 L4 L3 L12 L11 L15 L14 L2 A9 L1 A8 L0
sketch "Sketch43" plane through (0, 0, 0.7366) normal (0, 0, 1) x (1, 0, 0)
  line L0 (-25.4072, 314.2407) -> (76.1928, 314.2407) projected
  line L1 (76.1928, 415.8407) -> (76.1928, 314.2407) projected
  line L2 (76.1928, 415.8407) -> (-25.4072, 415.8407) projected
  line L3 (-25.4072, 415.8407) -> (-25.4072, 314.2407) projected
  circle A0 centre (-15.0948, 405.5283) radius 1.9812 projected
  circle A1 centre (-15.0948, 324.5531) radius 1.9812 projected
  circle A2 centre (65.8804, 324.5531) radius 1.9812 projected
  circle A3 centre (65.8804, 405.5283) radius 1.9812 projected
  point P0 (0, 0)
extrude "Extrusion43" cut sketch "Sketch43" against normal blind 6.35
sketch "Sketch44" plane through (-25.4072, 415.8407, -11.9634) normal (0, 1, 0) x (1, 0, 0)
  line L0 (0, -6.35) -> (101.6, -6.35) projected
  line L1 (101.6, 0) -> (101.6, -6.35) projected
  line L2 (0, 0) -> (101.6, 0) projected
  line L3 (0, -6.35) -> (0, 0) projected
  point P0 (25.4072, -11.9634)
extrude "Extrusion44" add sketch "Sketch44" along normal blind 19.05
sketch "Sketch45" plane through (-25.4072, 314.2407, -11.9634) normal (0, -1, 0) x (1, 0, 0)
  line L0 (101.6, 6.35) -> (0, 6.35) projected
  line L1 (0, 6.35) -> (0, 0) projected
  line L2 (101.6, 0) -> (0, 0) projected
  line L3 (101.6, 6.35) -> (101.6, 0) projected
  point P0 (25.4072, 11.9634)
extrude "Extrusion45" add sketch "Sketch45" along normal blind 19.05
sketch "Sketch46" plane through (0, 0, -11.9634) normal (0, 0, -1) x (-1, 0, 0)
  line L0 (-76.1928, 295.1907) -> (25.4072, 295.1907) projected
  circle A0 centre (-65.8804, 324.5531) radius 1.9812 projected
  circle A1 centre (15.0948, 324.5531) radius 1.9812 projected
  circle A2 centre (15.0948, 405.5283) radius 1.9812 projected
  line L1 (-65.8804, 324.5531) -> (15.0948, 324.5531)
  line L2 (15.0948, 324.5531) -> (15.0948, 405.5283)
  circle A3 centre (-25.3928, 365.0407) radius 11.5
  line L3 (-25.3928, 365.0407) -> (-35.8928, 365.0407)
  line L4 (-35.8928, 365.0407) -> (-14.8928, 365.0407)
  line L5 (-14.8928, 365.0407) -> (-14.8928, 400.0407)
  line L6 (-14.8928, 400.0407) -> (-35.8928, 400.0407)
  line L7 (-35.8928, 400.0407) -> (-35.8928, 365.0407)
  point P0 (0, 0)
  dimension "d118" = 23
  dimension "d119" = 10.5
  dimension "d120" = 21
  dimension "d121" = 35
extrude "Extrusion46" cut sketch "Sketch46" against normal blind 19.05 contours A3 L7 L3 L4 L5 | L5 L4 L3 L7 A3 | A3 L7 L6 L5
sketch "Sketch47" plane through (0, 0, -11.9634) normal (0, 0, -1) x (-1, 0, 0)
  arc A0 (-35.8928, 369.7311) -> (-14.8928, 369.7311) centre (-25.3928, 365.0407) ccw projected
  line L0 (-76.1928, 295.1907) -> (25.4072, 295.1907) projected
  line L1 (-25.3928, 365.0407) -> (-38.8928, 365.0407)
  line L2 (-38.8928, 365.0407) -> (-38.8928, 371.5407)
  line L3 (-38.8928, 371.5407) -> (-38.8928, 379.5407)
  line L4 (-38.8928, 379.5407) -> (-38.8928, 387.5407)
  line L5 (-38.8928, 371.5407) -> (-11.8928, 371.5407)
  line L6 (-38.8928, 387.5407) -> (-11.8928, 387.5407)
  circle A1 centre (-38.8928, 371.5407) radius 1
  circle A2 centre (-38.8928, 387.5407) radius 1
  circle A3 centre (-11.8928, 371.5407) radius 1
  circle A4 centre (-11.8928, 387.5407) radius 1
  point P0 (0, 0)
  dimension "d124" = 13.5
  dimension "d125" = 6.5
  dimension "d126" = 8
  dimension "d127" = 8
  dimension "d128" = 27
  dimension "d129" = 27
  dimension "d130" = 2
extrude "Extrusion47" cut sketch "Sketch47" against normal blind 25.4
sketch "Sketch49" plane through (-25.4072, 295.1907, -11.9634) normal (0, -1, 0) x (1, 0, 0)
  line L0 (101.6, 6.35) -> (101.6, 0) projected
  line L1 (0, 6.35) -> (101.6, 6.35) projected
  line L2 (0, 0) -> (0, 6.35) projected
  line L3 (101.6, 0) -> (0, 0) projected
  point P0 (25.4072, 11.9634)
extrude "Extrusion48" add sketch "Sketch49" along normal blind 3.175
sketch "Sketch50" plane through (-25.4072, 434.8907, -11.9634) normal (0, 1, 0) x (1, 0, 0)
  line L0 (0, -6.35) -> (0, 0) projected
  line L1 (101.6, -6.35) -> (0, -6.35) projected
  line L2 (101.6, 0) -> (101.6, -6.35) projected
  line L3 (0, 0) -> (101.6, 0) projected
  point P0 (25.4072, -11.9634)
extrude "Extrusion49" add sketch "Sketch50" along normal blind 3.175
properties part number "kinect base closer holes"
